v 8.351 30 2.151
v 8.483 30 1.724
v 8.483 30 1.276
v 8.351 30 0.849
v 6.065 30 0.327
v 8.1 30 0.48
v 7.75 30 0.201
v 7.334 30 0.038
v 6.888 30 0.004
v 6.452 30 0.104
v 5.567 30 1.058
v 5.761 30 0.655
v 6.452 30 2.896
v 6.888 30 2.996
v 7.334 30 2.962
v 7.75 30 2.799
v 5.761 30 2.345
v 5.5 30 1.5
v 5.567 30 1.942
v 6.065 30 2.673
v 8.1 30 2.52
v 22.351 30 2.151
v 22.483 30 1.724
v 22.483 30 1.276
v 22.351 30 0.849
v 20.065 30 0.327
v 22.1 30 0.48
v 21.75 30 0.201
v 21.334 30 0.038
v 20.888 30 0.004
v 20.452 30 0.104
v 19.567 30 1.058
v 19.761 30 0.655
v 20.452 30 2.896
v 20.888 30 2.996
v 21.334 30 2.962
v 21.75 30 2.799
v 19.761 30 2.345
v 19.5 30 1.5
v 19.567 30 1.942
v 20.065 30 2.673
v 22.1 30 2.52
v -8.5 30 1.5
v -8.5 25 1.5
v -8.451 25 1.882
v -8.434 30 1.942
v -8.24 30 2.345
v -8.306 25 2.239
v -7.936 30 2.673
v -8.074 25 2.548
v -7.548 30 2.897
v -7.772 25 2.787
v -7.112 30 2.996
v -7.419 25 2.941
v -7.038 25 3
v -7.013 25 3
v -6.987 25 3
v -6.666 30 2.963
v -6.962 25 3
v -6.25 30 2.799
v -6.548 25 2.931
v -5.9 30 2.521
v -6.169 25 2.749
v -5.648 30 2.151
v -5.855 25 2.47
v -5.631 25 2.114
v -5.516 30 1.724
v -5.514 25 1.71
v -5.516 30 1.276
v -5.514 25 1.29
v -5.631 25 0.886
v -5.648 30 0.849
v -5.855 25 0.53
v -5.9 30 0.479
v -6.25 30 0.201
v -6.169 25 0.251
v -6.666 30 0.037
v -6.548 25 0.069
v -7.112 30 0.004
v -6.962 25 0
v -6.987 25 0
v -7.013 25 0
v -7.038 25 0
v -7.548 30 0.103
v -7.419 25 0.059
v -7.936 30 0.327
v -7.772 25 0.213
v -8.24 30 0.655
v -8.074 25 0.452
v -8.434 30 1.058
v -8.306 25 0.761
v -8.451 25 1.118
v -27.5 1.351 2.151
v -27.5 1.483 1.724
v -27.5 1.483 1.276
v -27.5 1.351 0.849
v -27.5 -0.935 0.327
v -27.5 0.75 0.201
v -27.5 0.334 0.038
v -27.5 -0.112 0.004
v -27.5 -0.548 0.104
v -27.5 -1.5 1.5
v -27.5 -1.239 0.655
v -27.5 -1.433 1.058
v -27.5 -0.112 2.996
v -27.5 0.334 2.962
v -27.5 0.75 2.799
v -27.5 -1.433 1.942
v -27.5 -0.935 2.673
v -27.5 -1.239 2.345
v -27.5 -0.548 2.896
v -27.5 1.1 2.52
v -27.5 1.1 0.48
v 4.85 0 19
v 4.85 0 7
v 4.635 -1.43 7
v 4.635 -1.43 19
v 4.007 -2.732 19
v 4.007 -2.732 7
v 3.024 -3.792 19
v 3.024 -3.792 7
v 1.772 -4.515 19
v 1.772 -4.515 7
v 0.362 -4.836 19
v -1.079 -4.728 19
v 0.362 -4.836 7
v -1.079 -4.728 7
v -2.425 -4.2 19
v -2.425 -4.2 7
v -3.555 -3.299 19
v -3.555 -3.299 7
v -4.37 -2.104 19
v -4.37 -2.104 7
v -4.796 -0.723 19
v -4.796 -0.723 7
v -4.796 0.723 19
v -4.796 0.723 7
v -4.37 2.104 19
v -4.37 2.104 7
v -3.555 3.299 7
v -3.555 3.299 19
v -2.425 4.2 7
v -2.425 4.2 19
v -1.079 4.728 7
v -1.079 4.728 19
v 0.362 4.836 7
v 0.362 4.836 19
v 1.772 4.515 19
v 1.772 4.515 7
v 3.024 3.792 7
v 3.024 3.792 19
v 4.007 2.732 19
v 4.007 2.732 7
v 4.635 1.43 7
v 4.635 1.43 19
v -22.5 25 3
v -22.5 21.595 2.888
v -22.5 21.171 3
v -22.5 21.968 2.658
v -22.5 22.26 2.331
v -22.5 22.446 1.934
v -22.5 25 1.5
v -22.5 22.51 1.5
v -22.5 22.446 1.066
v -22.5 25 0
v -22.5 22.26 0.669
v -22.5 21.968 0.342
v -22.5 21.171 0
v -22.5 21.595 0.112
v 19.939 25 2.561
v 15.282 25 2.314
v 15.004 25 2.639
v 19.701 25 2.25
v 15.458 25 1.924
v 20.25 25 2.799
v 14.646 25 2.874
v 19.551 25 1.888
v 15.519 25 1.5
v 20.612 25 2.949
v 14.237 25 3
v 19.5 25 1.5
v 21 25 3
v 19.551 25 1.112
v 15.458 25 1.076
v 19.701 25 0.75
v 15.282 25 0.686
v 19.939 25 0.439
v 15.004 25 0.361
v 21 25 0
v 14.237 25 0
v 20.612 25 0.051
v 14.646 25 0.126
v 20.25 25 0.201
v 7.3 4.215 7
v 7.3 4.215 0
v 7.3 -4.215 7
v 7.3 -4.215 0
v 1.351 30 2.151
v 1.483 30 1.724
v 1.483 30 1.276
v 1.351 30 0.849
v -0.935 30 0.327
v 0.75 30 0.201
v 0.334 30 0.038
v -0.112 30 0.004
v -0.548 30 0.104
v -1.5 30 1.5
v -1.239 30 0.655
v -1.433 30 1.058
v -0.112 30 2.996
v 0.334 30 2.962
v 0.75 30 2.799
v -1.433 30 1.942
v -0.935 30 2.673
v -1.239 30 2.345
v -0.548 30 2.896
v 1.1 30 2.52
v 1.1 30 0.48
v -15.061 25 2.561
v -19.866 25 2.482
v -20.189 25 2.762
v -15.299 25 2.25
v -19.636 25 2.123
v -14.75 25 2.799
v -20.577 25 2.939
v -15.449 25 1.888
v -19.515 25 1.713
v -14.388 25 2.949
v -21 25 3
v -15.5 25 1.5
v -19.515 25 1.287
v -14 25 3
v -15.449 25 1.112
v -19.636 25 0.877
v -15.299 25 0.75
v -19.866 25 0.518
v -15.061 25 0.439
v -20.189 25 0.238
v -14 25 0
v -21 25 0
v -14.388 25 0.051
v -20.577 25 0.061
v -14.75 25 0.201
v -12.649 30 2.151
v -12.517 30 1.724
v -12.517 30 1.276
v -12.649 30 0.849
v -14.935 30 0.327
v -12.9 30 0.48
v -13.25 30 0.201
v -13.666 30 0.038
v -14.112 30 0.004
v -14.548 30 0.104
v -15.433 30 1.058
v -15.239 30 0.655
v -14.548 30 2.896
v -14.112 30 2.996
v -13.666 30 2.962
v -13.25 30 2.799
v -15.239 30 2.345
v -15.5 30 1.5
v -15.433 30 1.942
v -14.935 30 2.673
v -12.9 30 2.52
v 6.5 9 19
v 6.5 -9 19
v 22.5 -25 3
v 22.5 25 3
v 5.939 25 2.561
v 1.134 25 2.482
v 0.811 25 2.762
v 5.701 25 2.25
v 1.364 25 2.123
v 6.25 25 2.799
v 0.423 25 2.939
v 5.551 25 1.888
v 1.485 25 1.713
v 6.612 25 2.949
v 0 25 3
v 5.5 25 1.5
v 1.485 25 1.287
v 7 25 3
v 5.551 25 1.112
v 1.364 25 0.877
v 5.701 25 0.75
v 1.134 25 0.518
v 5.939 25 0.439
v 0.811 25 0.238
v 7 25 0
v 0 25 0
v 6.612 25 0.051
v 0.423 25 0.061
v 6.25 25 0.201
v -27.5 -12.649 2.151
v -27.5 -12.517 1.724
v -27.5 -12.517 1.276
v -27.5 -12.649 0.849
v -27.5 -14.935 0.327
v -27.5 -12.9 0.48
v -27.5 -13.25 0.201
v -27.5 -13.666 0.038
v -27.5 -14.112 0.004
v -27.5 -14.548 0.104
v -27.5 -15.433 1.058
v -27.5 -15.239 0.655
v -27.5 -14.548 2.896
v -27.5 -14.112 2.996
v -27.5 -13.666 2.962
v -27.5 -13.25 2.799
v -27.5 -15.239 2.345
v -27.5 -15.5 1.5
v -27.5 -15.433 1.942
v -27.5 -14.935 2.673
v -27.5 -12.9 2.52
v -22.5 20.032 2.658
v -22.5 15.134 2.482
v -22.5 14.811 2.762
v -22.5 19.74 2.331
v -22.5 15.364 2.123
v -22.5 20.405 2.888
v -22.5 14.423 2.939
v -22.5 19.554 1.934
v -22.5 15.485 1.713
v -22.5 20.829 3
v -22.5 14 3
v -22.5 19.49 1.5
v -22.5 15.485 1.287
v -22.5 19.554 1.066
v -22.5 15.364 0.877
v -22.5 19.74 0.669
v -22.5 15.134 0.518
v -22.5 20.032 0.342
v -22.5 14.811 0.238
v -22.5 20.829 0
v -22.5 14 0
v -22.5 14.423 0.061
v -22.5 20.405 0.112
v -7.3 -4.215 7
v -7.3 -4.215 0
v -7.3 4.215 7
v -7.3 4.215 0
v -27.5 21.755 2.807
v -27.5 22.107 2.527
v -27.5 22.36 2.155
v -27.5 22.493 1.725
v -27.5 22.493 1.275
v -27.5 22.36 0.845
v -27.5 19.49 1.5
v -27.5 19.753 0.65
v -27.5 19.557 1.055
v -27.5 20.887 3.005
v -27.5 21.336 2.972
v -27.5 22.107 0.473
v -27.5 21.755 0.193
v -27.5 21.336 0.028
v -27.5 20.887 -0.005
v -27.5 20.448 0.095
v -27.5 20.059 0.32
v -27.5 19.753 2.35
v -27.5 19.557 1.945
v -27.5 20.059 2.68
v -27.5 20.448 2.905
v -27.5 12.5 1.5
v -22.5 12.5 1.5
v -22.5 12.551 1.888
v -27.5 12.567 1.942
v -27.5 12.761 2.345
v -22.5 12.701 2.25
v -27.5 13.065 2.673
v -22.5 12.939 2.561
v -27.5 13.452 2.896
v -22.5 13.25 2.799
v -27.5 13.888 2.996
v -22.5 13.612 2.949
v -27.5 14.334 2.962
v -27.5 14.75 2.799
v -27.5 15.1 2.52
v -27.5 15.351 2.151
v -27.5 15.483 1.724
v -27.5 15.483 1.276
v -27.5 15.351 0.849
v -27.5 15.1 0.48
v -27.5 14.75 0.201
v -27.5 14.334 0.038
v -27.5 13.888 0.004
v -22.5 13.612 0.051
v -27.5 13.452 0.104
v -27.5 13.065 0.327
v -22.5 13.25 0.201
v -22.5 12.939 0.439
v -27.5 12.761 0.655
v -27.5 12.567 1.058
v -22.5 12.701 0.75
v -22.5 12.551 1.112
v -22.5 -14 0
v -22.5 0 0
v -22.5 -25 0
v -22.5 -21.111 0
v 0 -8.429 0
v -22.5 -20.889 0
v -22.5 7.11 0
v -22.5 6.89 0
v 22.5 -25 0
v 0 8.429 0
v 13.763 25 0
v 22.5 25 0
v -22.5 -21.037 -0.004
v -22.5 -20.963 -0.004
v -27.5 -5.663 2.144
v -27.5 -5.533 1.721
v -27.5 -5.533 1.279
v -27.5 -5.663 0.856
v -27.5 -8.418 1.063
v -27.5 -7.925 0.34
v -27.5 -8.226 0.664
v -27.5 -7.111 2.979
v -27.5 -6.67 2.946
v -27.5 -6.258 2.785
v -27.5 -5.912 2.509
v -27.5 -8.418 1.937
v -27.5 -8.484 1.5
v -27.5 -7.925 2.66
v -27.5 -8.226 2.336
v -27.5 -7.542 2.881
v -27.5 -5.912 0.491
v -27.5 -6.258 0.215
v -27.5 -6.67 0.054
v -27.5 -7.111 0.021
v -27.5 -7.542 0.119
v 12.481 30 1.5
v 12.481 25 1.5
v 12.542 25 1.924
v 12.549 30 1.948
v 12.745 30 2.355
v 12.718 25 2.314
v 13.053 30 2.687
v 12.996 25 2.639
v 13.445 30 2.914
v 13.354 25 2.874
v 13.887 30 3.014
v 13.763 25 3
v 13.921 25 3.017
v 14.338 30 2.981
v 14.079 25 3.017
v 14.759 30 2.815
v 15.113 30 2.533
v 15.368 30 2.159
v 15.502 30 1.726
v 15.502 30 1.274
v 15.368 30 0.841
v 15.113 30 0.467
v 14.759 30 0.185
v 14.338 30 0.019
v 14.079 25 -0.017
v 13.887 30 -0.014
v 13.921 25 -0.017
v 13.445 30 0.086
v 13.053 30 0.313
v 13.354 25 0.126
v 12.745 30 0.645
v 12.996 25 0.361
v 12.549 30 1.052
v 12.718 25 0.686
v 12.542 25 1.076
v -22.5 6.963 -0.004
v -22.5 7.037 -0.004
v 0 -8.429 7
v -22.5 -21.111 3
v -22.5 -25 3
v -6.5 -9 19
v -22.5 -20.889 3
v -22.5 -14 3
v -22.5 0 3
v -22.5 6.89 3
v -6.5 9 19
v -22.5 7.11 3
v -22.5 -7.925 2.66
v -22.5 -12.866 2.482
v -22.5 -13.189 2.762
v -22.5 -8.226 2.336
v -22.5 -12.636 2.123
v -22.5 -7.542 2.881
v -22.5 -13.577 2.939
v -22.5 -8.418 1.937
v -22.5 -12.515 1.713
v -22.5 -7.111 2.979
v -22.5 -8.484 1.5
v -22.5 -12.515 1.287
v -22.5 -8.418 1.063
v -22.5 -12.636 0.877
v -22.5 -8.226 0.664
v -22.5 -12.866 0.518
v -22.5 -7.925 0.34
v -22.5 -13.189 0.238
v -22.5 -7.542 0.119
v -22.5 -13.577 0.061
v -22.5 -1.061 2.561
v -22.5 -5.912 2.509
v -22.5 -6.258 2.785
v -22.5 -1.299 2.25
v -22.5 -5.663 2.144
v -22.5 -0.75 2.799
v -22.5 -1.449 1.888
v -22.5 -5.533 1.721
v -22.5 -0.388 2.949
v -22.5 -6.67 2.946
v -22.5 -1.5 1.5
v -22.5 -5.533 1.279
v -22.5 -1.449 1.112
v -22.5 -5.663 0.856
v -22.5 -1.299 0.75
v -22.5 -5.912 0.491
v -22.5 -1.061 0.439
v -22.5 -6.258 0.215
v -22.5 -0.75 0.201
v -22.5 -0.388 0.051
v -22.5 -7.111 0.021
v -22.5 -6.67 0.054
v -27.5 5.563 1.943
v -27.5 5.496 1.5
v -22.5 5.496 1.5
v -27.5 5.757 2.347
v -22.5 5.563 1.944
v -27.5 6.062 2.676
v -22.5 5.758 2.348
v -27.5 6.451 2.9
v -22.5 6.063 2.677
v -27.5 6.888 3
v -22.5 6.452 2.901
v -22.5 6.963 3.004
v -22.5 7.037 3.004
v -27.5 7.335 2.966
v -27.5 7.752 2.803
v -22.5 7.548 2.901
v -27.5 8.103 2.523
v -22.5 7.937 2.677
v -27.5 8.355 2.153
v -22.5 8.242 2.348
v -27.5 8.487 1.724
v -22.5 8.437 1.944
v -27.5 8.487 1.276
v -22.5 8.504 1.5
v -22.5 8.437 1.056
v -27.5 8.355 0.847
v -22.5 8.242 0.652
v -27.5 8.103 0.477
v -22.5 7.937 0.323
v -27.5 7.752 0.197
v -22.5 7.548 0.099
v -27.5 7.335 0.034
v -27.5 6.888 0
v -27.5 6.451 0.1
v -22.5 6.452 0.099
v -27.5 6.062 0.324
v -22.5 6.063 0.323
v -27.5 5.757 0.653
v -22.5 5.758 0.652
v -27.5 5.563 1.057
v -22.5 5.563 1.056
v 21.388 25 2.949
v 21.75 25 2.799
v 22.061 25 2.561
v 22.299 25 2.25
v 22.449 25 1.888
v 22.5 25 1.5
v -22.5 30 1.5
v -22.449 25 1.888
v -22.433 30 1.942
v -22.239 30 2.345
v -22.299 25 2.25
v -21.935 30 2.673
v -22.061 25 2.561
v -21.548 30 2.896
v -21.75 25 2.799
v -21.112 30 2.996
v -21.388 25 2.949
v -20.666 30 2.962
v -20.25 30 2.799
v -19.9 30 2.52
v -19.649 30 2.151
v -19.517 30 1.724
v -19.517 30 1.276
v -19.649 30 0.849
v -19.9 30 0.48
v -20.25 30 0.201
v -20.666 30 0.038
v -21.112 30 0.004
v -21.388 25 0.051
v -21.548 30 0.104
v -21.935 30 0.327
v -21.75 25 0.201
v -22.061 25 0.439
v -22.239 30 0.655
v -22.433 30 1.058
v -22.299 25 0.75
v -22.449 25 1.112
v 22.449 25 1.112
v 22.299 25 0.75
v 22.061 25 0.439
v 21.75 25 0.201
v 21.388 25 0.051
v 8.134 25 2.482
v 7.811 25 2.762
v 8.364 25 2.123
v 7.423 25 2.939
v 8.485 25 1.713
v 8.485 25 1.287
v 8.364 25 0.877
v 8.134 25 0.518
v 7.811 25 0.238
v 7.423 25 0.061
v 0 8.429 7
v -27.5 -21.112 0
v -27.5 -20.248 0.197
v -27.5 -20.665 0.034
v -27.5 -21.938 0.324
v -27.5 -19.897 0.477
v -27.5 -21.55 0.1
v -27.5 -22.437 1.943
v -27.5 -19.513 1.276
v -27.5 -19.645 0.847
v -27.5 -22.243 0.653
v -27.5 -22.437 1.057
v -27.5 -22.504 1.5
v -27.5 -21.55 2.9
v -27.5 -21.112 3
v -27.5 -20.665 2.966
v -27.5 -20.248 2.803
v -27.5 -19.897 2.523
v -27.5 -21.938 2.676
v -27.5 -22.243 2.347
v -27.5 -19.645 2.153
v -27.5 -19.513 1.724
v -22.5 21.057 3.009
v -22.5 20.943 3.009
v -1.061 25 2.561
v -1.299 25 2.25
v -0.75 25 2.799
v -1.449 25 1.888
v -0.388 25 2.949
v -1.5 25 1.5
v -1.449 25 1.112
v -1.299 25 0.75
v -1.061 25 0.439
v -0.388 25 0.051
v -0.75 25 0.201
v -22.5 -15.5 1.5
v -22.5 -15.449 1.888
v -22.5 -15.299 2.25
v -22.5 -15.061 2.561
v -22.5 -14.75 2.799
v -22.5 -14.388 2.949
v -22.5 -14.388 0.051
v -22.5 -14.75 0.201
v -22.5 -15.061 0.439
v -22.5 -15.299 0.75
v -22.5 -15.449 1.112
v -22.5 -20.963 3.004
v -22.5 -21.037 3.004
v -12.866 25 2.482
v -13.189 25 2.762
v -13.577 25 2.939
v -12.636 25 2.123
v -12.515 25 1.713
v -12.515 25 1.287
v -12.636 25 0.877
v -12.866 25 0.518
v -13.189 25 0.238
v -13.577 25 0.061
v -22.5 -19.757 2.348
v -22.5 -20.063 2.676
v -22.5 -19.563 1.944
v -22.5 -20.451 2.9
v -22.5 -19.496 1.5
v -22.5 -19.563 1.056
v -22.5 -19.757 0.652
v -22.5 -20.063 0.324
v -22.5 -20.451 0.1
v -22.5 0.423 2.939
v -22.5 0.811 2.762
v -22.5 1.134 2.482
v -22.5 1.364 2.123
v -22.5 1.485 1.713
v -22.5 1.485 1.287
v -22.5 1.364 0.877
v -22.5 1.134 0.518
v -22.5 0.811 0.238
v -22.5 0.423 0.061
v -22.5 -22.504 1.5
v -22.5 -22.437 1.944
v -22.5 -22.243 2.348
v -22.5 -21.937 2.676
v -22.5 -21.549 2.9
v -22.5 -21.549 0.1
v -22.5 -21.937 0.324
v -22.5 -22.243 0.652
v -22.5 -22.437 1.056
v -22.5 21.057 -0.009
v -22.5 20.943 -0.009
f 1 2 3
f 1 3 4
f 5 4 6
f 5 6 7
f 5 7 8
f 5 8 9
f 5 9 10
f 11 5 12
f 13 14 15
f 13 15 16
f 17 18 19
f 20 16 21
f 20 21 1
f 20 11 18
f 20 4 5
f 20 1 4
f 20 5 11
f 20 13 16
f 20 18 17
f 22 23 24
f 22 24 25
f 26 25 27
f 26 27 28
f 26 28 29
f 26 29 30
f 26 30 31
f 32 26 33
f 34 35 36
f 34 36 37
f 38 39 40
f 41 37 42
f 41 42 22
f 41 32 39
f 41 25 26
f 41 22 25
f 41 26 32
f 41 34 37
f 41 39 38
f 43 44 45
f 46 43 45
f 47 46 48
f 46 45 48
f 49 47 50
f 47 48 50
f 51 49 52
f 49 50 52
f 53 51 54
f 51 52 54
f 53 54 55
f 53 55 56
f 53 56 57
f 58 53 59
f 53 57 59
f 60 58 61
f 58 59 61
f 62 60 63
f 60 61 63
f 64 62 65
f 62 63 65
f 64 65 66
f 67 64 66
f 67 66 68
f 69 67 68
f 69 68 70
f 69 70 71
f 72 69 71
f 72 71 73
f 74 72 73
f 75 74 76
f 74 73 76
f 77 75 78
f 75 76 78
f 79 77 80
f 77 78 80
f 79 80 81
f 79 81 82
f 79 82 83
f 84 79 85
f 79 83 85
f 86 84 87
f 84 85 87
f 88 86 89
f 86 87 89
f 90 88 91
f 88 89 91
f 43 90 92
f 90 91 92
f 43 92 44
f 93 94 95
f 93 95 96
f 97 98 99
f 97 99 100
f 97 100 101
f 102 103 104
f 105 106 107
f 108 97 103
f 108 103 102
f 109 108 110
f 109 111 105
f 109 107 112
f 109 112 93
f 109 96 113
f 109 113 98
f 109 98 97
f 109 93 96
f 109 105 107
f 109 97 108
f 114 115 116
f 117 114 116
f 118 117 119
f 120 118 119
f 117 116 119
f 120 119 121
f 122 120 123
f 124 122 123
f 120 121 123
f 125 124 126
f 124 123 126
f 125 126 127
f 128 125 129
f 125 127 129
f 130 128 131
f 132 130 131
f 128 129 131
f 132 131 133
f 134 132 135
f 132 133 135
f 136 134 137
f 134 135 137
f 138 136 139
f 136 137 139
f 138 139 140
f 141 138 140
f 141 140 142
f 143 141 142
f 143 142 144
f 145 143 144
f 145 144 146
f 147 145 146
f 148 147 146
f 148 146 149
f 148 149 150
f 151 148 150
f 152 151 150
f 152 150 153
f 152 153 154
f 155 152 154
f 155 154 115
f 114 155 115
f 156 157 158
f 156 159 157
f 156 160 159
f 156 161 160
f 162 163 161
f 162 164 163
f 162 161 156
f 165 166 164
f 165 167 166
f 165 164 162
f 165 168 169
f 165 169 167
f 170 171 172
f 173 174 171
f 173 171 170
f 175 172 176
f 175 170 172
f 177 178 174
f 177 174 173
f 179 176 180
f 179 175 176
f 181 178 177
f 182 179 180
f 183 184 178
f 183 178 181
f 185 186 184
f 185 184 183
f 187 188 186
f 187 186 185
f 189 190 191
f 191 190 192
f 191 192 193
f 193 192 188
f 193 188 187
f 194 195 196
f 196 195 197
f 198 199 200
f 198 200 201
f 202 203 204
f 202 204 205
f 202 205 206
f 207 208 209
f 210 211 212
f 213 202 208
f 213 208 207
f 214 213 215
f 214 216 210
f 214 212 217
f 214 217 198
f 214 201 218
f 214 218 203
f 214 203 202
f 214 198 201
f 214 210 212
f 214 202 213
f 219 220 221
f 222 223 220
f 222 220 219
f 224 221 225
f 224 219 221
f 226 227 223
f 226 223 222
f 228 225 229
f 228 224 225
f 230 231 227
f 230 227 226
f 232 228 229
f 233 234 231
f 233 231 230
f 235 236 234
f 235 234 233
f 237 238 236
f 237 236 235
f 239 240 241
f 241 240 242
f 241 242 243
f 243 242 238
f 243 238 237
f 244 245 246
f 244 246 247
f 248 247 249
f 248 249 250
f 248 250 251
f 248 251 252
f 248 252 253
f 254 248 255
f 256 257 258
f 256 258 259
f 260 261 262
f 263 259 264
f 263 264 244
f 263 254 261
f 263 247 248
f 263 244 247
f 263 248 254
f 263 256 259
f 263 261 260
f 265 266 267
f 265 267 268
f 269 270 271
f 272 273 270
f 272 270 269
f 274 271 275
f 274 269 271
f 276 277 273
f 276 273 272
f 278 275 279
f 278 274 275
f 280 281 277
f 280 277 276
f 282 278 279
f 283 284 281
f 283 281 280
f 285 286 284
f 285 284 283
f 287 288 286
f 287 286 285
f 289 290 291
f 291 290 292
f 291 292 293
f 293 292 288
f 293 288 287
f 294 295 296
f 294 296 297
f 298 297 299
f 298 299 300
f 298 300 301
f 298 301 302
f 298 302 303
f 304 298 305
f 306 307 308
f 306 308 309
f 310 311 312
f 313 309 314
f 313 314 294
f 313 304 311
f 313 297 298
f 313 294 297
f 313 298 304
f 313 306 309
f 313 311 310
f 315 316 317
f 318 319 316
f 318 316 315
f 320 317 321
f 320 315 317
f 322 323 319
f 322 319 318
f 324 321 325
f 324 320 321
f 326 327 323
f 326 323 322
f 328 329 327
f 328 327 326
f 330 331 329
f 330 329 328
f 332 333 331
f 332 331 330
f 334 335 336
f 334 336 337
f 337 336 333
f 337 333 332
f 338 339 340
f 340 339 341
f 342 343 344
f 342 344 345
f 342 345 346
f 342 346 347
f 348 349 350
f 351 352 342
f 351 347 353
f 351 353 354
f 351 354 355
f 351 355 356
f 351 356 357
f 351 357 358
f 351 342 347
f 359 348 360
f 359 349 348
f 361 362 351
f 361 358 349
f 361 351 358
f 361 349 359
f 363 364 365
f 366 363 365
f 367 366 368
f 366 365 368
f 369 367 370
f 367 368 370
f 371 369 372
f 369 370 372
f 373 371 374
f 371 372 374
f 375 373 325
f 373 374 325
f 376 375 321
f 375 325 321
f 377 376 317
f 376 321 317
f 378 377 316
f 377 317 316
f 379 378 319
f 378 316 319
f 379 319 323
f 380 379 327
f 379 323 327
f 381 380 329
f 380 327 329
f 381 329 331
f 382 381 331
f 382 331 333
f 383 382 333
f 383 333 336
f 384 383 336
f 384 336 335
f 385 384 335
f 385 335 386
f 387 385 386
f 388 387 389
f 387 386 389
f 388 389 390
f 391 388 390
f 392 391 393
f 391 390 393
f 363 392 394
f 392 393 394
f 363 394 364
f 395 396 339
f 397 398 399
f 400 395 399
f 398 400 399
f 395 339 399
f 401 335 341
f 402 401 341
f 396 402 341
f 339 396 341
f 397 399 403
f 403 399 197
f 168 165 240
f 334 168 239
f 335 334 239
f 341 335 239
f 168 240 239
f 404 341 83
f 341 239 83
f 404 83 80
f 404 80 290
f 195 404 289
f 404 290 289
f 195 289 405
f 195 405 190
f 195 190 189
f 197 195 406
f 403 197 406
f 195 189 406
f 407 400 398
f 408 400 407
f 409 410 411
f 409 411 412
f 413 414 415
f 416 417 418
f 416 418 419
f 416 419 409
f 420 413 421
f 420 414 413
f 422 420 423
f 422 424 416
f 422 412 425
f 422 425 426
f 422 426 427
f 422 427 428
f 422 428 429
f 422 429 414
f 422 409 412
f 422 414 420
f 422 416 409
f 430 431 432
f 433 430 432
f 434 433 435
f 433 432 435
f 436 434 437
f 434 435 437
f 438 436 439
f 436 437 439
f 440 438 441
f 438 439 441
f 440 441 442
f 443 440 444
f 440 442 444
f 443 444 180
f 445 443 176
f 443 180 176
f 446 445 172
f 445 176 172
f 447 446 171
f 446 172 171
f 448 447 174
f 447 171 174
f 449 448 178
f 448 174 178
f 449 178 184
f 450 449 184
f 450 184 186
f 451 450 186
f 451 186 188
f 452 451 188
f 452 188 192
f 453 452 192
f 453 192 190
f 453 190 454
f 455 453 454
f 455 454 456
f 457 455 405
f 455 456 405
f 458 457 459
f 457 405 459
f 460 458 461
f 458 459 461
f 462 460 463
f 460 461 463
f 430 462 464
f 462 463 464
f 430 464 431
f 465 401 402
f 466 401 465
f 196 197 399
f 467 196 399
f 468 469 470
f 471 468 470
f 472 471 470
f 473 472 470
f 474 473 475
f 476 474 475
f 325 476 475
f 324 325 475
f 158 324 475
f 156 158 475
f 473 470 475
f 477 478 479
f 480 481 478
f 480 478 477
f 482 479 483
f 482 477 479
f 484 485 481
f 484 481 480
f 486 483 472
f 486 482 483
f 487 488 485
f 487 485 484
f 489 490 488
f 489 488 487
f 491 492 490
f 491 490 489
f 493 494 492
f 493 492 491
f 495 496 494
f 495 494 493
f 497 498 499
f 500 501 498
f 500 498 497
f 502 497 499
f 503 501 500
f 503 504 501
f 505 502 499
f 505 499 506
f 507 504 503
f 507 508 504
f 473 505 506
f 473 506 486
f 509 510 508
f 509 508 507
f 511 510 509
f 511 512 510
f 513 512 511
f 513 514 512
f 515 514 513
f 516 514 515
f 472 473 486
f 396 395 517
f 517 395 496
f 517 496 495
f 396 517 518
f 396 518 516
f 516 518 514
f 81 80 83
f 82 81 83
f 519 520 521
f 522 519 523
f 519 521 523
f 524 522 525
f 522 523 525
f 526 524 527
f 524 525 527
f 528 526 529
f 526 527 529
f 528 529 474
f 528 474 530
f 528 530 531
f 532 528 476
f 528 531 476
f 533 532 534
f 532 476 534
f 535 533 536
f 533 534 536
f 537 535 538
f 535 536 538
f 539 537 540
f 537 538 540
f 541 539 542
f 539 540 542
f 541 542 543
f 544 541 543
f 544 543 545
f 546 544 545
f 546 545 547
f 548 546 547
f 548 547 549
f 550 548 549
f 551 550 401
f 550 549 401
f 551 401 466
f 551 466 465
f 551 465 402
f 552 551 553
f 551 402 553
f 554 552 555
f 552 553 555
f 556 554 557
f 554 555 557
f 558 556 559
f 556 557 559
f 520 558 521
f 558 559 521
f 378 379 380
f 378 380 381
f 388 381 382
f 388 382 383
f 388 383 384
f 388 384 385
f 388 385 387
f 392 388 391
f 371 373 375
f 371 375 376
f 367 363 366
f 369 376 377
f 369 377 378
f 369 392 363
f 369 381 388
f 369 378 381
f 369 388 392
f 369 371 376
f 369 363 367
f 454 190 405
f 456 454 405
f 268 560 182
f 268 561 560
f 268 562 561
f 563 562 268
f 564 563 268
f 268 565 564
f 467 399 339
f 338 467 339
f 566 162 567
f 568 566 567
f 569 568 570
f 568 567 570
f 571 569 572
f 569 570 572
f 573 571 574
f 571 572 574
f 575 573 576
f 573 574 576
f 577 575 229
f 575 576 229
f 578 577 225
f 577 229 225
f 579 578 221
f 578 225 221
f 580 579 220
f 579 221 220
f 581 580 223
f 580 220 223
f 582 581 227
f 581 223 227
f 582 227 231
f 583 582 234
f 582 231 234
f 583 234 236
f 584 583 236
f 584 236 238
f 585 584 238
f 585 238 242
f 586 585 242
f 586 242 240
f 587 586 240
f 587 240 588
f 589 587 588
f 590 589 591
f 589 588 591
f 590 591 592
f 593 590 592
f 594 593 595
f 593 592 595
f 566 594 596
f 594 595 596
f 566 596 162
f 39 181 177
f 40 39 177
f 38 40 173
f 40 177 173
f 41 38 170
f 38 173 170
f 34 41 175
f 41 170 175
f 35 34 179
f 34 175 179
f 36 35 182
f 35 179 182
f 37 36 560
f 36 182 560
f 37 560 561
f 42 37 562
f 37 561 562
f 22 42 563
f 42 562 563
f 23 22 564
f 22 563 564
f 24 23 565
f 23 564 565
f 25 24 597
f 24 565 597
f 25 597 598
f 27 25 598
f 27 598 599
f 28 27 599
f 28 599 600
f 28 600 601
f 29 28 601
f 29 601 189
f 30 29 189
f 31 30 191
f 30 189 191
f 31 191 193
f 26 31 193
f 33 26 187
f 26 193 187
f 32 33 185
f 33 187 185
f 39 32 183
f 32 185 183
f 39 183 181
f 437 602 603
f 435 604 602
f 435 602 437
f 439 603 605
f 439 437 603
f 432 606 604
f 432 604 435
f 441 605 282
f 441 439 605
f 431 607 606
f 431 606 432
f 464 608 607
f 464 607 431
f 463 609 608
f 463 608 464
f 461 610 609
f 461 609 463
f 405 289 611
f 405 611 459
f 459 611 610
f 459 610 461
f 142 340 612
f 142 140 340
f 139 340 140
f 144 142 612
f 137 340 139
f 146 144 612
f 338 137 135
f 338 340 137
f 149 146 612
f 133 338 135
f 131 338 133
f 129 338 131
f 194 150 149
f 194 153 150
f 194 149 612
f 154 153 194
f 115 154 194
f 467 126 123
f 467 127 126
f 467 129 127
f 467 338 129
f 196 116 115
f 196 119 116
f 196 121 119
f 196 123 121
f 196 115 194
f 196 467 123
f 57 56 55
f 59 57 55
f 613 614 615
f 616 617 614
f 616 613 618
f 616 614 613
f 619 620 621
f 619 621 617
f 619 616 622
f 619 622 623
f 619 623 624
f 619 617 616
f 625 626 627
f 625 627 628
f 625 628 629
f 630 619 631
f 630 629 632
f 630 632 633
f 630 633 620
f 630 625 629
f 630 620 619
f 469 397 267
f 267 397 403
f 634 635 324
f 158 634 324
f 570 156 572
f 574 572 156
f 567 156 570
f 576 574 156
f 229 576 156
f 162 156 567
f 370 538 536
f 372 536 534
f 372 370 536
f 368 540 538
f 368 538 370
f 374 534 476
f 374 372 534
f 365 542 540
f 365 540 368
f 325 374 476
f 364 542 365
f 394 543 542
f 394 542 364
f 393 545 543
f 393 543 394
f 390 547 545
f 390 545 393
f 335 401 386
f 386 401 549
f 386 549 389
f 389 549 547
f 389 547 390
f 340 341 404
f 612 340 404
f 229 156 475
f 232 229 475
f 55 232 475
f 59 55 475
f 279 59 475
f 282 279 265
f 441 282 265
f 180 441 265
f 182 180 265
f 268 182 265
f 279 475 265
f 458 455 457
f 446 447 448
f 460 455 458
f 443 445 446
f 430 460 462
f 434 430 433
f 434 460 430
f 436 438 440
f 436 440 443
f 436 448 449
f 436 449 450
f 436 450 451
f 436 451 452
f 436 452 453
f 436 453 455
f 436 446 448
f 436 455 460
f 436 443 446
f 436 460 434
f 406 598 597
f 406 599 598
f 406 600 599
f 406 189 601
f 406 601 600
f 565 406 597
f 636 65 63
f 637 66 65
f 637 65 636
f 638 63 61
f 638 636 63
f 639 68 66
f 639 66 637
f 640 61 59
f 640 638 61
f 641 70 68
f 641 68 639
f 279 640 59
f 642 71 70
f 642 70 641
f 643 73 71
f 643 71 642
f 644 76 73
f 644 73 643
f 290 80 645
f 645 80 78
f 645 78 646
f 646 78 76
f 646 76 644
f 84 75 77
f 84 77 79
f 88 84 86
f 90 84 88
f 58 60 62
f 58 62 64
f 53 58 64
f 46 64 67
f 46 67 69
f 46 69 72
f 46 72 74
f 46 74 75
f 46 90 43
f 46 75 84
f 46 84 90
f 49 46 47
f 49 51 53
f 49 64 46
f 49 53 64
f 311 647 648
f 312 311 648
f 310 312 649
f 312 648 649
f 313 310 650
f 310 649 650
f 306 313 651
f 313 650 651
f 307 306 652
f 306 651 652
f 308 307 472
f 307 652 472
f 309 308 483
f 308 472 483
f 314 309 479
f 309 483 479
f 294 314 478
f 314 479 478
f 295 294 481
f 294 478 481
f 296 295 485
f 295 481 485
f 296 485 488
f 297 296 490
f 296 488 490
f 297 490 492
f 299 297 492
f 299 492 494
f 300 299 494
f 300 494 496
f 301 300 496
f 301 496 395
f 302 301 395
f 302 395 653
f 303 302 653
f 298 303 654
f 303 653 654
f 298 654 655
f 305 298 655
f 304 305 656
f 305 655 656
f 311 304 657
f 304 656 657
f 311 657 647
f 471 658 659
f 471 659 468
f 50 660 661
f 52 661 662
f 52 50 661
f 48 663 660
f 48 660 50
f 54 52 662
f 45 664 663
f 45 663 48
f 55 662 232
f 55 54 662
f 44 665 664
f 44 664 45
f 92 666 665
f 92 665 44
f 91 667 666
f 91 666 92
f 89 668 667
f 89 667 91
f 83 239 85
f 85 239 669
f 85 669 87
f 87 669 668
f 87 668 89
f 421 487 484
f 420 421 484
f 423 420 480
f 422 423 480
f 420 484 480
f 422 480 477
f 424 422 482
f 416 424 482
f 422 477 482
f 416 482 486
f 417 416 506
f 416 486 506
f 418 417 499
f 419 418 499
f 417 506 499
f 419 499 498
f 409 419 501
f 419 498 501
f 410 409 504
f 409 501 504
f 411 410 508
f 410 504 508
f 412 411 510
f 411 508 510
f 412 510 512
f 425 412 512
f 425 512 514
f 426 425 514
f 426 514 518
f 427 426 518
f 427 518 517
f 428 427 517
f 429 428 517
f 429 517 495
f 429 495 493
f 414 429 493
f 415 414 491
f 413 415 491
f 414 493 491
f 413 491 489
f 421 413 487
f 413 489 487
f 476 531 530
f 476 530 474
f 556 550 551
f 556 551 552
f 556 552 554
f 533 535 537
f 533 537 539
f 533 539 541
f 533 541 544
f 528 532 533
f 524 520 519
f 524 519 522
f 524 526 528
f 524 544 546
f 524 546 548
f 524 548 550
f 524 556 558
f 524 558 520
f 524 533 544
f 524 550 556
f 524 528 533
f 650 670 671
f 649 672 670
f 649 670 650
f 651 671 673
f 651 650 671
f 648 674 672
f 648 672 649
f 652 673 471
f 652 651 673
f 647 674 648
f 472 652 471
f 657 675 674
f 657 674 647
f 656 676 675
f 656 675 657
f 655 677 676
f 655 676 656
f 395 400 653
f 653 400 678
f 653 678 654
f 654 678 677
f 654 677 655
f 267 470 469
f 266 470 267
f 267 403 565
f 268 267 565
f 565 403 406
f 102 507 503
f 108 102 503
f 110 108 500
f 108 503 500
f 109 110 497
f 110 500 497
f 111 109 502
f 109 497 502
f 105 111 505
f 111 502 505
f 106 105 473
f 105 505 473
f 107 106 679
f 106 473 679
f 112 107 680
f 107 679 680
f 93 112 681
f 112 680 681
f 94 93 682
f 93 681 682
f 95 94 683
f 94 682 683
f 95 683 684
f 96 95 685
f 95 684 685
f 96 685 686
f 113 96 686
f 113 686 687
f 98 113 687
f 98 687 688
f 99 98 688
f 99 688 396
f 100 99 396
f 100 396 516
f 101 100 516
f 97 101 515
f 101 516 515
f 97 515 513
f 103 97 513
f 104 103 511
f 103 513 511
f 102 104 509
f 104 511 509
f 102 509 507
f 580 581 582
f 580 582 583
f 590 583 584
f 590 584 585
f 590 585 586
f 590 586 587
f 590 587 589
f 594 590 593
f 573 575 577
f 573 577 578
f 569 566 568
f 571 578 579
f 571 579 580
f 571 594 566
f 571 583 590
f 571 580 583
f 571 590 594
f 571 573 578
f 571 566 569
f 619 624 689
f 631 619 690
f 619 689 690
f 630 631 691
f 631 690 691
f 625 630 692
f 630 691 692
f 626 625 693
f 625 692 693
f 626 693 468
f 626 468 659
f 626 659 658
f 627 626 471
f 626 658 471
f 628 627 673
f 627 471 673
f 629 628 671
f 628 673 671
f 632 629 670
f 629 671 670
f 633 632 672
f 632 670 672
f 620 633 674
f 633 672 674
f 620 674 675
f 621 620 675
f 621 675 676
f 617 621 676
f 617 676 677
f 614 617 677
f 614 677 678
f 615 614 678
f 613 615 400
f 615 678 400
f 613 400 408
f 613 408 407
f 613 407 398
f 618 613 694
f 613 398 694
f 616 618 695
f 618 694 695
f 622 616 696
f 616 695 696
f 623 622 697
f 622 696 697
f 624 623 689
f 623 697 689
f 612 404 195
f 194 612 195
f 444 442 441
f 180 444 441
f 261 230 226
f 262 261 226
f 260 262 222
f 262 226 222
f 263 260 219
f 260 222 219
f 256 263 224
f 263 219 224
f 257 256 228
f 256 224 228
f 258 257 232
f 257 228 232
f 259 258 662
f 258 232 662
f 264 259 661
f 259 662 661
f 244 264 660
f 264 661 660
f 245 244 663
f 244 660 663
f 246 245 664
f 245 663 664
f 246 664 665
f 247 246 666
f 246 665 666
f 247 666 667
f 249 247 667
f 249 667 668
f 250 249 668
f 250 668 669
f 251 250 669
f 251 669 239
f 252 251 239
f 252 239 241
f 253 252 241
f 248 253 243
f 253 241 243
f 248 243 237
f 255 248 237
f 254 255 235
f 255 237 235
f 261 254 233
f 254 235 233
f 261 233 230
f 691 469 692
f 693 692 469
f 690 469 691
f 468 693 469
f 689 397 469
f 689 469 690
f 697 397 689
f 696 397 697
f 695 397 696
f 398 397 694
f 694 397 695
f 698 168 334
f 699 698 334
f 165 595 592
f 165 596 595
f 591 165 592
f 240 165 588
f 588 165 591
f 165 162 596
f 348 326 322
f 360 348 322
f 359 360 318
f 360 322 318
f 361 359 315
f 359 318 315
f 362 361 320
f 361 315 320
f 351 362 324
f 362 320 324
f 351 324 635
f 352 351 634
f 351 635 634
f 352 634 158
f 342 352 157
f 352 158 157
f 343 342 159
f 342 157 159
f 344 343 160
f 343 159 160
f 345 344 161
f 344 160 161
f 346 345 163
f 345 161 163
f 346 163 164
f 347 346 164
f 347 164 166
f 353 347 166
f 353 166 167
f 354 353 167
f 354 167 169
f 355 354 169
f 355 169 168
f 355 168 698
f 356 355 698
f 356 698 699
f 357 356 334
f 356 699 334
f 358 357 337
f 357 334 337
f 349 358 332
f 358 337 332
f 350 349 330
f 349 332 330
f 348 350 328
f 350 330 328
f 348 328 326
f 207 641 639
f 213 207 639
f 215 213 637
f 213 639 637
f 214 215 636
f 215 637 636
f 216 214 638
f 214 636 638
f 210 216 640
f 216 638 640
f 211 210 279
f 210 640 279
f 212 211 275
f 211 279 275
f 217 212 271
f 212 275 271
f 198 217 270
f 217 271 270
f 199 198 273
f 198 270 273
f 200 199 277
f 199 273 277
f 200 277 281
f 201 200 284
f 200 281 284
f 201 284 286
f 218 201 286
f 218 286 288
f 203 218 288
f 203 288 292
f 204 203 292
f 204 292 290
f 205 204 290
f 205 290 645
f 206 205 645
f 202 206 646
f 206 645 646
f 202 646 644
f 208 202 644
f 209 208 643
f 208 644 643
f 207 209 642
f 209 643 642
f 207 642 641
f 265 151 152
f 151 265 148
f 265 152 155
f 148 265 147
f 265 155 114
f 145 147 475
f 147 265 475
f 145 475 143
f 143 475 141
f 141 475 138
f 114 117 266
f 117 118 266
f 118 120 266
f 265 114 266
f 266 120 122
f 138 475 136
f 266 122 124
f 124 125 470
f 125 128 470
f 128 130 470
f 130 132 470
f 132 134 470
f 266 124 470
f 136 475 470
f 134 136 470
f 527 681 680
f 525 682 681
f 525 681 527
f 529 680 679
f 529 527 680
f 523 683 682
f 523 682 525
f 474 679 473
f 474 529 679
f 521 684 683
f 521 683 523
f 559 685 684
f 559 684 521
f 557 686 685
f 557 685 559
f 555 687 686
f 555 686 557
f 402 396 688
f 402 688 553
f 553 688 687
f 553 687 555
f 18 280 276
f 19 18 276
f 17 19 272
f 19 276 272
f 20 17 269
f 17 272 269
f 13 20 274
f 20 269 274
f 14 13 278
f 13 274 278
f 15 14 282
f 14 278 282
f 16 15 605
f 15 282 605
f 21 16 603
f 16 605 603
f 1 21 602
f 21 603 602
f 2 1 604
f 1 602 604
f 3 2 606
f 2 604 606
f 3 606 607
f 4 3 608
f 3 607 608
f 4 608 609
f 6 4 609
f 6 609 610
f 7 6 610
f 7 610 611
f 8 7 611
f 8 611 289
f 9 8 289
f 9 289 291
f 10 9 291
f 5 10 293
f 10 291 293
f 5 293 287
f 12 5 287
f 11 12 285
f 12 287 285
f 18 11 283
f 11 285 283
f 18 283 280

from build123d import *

# Parameters (mm, degrees)
SKETCH_W        = 45
SKETCH_H        = 50
PAD_DEPTH       = 25
CHAMFER_SIZE    = 22
SKETCH001_R     = 4.85
POCKET_DEPTH    = 25.001
SKETCH002_W     = 32.700705
SKETCH002_H     = 10
POCKET001_DEPTH = 45.001
SKETCH003_R     = 1.5
SKETCH003_R_2   = 1.518583
SKETCH003_R_3   = 1.500476
PAD001_DEPTH    = 5
SKETCH004_R     = 1.5
SKETCH004_R_2   = 1.504062
SKETCH004_R_3   = 1.509717
SKETCH004_R_4   = 1.483533
SKETCH004_R_5   = 1.504121
PAD002_DEPTH    = 5
POCKET002_DEPTH = 7


with BuildPart() as part:
    # Sketch → Pad (new body)
    with BuildSketch(Plane.XY):
        Rectangle(SKETCH_W, SKETCH_H)
    extrude(amount=PAD_DEPTH)

    # Chamfer
    chamfer_edges = [part.edges().sort_by_distance(p)[0] for p in [
        (0, 25, 25),
        (-22.5, 0, 25),
        (0, -25, 25),
        (22.5, 0, 25),
    ]]
    chamfer(chamfer_edges, length=CHAMFER_SIZE)

    # Sketch001 → Pocket (cut, through all)
    with BuildSketch(Plane(origin=(0, 0, 0), x_dir=(1, 0, 0), z_dir=(0, 0, -1))):
        Circle(SKETCH001_R)
    extrude(amount=-POCKET_DEPTH, mode=Mode.SUBTRACT)

    # Sketch002 → Pocket001 (cut, through all)
    with BuildSketch(Plane(origin=(-22.5, 0, 0), x_dir=(0, -1, 0), z_dir=(-1, 0, 0))):
        with Locations((-0.350352, 24)):
            Rectangle(SKETCH002_W, SKETCH002_H)
    extrude(amount=-POCKET001_DEPTH, mode=Mode.SUBTRACT)

    # Sketch003 → Pad001 (new body)
    with BuildSketch(Plane(origin=(0, 25, 0), x_dir=(-1, 0, 0), z_dir=(0, 1, 0))):
        with Locations((-21, 1.5)):
            Circle(SKETCH003_R)
        with Locations((-14, 1.5)):
            Circle(SKETCH003_R_2)
        with Locations((0, 1.5)):
            Circle(SKETCH003_R)
        with Locations((-7, 1.5)):
            Circle(SKETCH003_R)
        with Locations((7, 1.5)):
            Circle(SKETCH003_R_3)
        with Locations((14, 1.5)):
            Circle(SKETCH003_R)
        with Locations((21, 1.5)):
            Circle(SKETCH003_R)
    extrude(amount=PAD001_DEPTH)

    # Sketch004 → Pad002 (new body)
    with BuildSketch(Plane(origin=(-22.5, 0, 0), x_dir=(0, -1, 0), z_dir=(-1, 0, 0))):
        with Locations((0, 1.5)):
            Circle(SKETCH004_R)
        with Locations((-7, 1.5)):
            Circle(SKETCH004_R_2)
        with Locations((-14, 1.5)):
            Circle(SKETCH004_R)
        with Locations((-21, 1.5)):
            Circle(SKETCH004_R_3)
        with Locations((7, 1.5)):
            Circle(SKETCH004_R_4)
        with Locations((14, 1.5)):
            Circle(SKETCH004_R)
        with Locations((21, 1.5)):
            Circle(SKETCH004_R_5)
    extrude(amount=PAD002_DEPTH)

    # Sketch005 → Pocket002 (cut)
    with BuildSketch(Plane(origin=(0, 0, 0), x_dir=(1, 0, 0), z_dir=(0, 0, -1))):
        Polygon((7.3, -4.214657), (7.3, 4.214657), (0, 8.429314), (-7.3, 4.214657), (-7.3, -4.214657), (0, -8.429314), align=None)
    extrude(amount=-POCKET002_DEPTH, mode=Mode.SUBTRACT)


solid = part.part
